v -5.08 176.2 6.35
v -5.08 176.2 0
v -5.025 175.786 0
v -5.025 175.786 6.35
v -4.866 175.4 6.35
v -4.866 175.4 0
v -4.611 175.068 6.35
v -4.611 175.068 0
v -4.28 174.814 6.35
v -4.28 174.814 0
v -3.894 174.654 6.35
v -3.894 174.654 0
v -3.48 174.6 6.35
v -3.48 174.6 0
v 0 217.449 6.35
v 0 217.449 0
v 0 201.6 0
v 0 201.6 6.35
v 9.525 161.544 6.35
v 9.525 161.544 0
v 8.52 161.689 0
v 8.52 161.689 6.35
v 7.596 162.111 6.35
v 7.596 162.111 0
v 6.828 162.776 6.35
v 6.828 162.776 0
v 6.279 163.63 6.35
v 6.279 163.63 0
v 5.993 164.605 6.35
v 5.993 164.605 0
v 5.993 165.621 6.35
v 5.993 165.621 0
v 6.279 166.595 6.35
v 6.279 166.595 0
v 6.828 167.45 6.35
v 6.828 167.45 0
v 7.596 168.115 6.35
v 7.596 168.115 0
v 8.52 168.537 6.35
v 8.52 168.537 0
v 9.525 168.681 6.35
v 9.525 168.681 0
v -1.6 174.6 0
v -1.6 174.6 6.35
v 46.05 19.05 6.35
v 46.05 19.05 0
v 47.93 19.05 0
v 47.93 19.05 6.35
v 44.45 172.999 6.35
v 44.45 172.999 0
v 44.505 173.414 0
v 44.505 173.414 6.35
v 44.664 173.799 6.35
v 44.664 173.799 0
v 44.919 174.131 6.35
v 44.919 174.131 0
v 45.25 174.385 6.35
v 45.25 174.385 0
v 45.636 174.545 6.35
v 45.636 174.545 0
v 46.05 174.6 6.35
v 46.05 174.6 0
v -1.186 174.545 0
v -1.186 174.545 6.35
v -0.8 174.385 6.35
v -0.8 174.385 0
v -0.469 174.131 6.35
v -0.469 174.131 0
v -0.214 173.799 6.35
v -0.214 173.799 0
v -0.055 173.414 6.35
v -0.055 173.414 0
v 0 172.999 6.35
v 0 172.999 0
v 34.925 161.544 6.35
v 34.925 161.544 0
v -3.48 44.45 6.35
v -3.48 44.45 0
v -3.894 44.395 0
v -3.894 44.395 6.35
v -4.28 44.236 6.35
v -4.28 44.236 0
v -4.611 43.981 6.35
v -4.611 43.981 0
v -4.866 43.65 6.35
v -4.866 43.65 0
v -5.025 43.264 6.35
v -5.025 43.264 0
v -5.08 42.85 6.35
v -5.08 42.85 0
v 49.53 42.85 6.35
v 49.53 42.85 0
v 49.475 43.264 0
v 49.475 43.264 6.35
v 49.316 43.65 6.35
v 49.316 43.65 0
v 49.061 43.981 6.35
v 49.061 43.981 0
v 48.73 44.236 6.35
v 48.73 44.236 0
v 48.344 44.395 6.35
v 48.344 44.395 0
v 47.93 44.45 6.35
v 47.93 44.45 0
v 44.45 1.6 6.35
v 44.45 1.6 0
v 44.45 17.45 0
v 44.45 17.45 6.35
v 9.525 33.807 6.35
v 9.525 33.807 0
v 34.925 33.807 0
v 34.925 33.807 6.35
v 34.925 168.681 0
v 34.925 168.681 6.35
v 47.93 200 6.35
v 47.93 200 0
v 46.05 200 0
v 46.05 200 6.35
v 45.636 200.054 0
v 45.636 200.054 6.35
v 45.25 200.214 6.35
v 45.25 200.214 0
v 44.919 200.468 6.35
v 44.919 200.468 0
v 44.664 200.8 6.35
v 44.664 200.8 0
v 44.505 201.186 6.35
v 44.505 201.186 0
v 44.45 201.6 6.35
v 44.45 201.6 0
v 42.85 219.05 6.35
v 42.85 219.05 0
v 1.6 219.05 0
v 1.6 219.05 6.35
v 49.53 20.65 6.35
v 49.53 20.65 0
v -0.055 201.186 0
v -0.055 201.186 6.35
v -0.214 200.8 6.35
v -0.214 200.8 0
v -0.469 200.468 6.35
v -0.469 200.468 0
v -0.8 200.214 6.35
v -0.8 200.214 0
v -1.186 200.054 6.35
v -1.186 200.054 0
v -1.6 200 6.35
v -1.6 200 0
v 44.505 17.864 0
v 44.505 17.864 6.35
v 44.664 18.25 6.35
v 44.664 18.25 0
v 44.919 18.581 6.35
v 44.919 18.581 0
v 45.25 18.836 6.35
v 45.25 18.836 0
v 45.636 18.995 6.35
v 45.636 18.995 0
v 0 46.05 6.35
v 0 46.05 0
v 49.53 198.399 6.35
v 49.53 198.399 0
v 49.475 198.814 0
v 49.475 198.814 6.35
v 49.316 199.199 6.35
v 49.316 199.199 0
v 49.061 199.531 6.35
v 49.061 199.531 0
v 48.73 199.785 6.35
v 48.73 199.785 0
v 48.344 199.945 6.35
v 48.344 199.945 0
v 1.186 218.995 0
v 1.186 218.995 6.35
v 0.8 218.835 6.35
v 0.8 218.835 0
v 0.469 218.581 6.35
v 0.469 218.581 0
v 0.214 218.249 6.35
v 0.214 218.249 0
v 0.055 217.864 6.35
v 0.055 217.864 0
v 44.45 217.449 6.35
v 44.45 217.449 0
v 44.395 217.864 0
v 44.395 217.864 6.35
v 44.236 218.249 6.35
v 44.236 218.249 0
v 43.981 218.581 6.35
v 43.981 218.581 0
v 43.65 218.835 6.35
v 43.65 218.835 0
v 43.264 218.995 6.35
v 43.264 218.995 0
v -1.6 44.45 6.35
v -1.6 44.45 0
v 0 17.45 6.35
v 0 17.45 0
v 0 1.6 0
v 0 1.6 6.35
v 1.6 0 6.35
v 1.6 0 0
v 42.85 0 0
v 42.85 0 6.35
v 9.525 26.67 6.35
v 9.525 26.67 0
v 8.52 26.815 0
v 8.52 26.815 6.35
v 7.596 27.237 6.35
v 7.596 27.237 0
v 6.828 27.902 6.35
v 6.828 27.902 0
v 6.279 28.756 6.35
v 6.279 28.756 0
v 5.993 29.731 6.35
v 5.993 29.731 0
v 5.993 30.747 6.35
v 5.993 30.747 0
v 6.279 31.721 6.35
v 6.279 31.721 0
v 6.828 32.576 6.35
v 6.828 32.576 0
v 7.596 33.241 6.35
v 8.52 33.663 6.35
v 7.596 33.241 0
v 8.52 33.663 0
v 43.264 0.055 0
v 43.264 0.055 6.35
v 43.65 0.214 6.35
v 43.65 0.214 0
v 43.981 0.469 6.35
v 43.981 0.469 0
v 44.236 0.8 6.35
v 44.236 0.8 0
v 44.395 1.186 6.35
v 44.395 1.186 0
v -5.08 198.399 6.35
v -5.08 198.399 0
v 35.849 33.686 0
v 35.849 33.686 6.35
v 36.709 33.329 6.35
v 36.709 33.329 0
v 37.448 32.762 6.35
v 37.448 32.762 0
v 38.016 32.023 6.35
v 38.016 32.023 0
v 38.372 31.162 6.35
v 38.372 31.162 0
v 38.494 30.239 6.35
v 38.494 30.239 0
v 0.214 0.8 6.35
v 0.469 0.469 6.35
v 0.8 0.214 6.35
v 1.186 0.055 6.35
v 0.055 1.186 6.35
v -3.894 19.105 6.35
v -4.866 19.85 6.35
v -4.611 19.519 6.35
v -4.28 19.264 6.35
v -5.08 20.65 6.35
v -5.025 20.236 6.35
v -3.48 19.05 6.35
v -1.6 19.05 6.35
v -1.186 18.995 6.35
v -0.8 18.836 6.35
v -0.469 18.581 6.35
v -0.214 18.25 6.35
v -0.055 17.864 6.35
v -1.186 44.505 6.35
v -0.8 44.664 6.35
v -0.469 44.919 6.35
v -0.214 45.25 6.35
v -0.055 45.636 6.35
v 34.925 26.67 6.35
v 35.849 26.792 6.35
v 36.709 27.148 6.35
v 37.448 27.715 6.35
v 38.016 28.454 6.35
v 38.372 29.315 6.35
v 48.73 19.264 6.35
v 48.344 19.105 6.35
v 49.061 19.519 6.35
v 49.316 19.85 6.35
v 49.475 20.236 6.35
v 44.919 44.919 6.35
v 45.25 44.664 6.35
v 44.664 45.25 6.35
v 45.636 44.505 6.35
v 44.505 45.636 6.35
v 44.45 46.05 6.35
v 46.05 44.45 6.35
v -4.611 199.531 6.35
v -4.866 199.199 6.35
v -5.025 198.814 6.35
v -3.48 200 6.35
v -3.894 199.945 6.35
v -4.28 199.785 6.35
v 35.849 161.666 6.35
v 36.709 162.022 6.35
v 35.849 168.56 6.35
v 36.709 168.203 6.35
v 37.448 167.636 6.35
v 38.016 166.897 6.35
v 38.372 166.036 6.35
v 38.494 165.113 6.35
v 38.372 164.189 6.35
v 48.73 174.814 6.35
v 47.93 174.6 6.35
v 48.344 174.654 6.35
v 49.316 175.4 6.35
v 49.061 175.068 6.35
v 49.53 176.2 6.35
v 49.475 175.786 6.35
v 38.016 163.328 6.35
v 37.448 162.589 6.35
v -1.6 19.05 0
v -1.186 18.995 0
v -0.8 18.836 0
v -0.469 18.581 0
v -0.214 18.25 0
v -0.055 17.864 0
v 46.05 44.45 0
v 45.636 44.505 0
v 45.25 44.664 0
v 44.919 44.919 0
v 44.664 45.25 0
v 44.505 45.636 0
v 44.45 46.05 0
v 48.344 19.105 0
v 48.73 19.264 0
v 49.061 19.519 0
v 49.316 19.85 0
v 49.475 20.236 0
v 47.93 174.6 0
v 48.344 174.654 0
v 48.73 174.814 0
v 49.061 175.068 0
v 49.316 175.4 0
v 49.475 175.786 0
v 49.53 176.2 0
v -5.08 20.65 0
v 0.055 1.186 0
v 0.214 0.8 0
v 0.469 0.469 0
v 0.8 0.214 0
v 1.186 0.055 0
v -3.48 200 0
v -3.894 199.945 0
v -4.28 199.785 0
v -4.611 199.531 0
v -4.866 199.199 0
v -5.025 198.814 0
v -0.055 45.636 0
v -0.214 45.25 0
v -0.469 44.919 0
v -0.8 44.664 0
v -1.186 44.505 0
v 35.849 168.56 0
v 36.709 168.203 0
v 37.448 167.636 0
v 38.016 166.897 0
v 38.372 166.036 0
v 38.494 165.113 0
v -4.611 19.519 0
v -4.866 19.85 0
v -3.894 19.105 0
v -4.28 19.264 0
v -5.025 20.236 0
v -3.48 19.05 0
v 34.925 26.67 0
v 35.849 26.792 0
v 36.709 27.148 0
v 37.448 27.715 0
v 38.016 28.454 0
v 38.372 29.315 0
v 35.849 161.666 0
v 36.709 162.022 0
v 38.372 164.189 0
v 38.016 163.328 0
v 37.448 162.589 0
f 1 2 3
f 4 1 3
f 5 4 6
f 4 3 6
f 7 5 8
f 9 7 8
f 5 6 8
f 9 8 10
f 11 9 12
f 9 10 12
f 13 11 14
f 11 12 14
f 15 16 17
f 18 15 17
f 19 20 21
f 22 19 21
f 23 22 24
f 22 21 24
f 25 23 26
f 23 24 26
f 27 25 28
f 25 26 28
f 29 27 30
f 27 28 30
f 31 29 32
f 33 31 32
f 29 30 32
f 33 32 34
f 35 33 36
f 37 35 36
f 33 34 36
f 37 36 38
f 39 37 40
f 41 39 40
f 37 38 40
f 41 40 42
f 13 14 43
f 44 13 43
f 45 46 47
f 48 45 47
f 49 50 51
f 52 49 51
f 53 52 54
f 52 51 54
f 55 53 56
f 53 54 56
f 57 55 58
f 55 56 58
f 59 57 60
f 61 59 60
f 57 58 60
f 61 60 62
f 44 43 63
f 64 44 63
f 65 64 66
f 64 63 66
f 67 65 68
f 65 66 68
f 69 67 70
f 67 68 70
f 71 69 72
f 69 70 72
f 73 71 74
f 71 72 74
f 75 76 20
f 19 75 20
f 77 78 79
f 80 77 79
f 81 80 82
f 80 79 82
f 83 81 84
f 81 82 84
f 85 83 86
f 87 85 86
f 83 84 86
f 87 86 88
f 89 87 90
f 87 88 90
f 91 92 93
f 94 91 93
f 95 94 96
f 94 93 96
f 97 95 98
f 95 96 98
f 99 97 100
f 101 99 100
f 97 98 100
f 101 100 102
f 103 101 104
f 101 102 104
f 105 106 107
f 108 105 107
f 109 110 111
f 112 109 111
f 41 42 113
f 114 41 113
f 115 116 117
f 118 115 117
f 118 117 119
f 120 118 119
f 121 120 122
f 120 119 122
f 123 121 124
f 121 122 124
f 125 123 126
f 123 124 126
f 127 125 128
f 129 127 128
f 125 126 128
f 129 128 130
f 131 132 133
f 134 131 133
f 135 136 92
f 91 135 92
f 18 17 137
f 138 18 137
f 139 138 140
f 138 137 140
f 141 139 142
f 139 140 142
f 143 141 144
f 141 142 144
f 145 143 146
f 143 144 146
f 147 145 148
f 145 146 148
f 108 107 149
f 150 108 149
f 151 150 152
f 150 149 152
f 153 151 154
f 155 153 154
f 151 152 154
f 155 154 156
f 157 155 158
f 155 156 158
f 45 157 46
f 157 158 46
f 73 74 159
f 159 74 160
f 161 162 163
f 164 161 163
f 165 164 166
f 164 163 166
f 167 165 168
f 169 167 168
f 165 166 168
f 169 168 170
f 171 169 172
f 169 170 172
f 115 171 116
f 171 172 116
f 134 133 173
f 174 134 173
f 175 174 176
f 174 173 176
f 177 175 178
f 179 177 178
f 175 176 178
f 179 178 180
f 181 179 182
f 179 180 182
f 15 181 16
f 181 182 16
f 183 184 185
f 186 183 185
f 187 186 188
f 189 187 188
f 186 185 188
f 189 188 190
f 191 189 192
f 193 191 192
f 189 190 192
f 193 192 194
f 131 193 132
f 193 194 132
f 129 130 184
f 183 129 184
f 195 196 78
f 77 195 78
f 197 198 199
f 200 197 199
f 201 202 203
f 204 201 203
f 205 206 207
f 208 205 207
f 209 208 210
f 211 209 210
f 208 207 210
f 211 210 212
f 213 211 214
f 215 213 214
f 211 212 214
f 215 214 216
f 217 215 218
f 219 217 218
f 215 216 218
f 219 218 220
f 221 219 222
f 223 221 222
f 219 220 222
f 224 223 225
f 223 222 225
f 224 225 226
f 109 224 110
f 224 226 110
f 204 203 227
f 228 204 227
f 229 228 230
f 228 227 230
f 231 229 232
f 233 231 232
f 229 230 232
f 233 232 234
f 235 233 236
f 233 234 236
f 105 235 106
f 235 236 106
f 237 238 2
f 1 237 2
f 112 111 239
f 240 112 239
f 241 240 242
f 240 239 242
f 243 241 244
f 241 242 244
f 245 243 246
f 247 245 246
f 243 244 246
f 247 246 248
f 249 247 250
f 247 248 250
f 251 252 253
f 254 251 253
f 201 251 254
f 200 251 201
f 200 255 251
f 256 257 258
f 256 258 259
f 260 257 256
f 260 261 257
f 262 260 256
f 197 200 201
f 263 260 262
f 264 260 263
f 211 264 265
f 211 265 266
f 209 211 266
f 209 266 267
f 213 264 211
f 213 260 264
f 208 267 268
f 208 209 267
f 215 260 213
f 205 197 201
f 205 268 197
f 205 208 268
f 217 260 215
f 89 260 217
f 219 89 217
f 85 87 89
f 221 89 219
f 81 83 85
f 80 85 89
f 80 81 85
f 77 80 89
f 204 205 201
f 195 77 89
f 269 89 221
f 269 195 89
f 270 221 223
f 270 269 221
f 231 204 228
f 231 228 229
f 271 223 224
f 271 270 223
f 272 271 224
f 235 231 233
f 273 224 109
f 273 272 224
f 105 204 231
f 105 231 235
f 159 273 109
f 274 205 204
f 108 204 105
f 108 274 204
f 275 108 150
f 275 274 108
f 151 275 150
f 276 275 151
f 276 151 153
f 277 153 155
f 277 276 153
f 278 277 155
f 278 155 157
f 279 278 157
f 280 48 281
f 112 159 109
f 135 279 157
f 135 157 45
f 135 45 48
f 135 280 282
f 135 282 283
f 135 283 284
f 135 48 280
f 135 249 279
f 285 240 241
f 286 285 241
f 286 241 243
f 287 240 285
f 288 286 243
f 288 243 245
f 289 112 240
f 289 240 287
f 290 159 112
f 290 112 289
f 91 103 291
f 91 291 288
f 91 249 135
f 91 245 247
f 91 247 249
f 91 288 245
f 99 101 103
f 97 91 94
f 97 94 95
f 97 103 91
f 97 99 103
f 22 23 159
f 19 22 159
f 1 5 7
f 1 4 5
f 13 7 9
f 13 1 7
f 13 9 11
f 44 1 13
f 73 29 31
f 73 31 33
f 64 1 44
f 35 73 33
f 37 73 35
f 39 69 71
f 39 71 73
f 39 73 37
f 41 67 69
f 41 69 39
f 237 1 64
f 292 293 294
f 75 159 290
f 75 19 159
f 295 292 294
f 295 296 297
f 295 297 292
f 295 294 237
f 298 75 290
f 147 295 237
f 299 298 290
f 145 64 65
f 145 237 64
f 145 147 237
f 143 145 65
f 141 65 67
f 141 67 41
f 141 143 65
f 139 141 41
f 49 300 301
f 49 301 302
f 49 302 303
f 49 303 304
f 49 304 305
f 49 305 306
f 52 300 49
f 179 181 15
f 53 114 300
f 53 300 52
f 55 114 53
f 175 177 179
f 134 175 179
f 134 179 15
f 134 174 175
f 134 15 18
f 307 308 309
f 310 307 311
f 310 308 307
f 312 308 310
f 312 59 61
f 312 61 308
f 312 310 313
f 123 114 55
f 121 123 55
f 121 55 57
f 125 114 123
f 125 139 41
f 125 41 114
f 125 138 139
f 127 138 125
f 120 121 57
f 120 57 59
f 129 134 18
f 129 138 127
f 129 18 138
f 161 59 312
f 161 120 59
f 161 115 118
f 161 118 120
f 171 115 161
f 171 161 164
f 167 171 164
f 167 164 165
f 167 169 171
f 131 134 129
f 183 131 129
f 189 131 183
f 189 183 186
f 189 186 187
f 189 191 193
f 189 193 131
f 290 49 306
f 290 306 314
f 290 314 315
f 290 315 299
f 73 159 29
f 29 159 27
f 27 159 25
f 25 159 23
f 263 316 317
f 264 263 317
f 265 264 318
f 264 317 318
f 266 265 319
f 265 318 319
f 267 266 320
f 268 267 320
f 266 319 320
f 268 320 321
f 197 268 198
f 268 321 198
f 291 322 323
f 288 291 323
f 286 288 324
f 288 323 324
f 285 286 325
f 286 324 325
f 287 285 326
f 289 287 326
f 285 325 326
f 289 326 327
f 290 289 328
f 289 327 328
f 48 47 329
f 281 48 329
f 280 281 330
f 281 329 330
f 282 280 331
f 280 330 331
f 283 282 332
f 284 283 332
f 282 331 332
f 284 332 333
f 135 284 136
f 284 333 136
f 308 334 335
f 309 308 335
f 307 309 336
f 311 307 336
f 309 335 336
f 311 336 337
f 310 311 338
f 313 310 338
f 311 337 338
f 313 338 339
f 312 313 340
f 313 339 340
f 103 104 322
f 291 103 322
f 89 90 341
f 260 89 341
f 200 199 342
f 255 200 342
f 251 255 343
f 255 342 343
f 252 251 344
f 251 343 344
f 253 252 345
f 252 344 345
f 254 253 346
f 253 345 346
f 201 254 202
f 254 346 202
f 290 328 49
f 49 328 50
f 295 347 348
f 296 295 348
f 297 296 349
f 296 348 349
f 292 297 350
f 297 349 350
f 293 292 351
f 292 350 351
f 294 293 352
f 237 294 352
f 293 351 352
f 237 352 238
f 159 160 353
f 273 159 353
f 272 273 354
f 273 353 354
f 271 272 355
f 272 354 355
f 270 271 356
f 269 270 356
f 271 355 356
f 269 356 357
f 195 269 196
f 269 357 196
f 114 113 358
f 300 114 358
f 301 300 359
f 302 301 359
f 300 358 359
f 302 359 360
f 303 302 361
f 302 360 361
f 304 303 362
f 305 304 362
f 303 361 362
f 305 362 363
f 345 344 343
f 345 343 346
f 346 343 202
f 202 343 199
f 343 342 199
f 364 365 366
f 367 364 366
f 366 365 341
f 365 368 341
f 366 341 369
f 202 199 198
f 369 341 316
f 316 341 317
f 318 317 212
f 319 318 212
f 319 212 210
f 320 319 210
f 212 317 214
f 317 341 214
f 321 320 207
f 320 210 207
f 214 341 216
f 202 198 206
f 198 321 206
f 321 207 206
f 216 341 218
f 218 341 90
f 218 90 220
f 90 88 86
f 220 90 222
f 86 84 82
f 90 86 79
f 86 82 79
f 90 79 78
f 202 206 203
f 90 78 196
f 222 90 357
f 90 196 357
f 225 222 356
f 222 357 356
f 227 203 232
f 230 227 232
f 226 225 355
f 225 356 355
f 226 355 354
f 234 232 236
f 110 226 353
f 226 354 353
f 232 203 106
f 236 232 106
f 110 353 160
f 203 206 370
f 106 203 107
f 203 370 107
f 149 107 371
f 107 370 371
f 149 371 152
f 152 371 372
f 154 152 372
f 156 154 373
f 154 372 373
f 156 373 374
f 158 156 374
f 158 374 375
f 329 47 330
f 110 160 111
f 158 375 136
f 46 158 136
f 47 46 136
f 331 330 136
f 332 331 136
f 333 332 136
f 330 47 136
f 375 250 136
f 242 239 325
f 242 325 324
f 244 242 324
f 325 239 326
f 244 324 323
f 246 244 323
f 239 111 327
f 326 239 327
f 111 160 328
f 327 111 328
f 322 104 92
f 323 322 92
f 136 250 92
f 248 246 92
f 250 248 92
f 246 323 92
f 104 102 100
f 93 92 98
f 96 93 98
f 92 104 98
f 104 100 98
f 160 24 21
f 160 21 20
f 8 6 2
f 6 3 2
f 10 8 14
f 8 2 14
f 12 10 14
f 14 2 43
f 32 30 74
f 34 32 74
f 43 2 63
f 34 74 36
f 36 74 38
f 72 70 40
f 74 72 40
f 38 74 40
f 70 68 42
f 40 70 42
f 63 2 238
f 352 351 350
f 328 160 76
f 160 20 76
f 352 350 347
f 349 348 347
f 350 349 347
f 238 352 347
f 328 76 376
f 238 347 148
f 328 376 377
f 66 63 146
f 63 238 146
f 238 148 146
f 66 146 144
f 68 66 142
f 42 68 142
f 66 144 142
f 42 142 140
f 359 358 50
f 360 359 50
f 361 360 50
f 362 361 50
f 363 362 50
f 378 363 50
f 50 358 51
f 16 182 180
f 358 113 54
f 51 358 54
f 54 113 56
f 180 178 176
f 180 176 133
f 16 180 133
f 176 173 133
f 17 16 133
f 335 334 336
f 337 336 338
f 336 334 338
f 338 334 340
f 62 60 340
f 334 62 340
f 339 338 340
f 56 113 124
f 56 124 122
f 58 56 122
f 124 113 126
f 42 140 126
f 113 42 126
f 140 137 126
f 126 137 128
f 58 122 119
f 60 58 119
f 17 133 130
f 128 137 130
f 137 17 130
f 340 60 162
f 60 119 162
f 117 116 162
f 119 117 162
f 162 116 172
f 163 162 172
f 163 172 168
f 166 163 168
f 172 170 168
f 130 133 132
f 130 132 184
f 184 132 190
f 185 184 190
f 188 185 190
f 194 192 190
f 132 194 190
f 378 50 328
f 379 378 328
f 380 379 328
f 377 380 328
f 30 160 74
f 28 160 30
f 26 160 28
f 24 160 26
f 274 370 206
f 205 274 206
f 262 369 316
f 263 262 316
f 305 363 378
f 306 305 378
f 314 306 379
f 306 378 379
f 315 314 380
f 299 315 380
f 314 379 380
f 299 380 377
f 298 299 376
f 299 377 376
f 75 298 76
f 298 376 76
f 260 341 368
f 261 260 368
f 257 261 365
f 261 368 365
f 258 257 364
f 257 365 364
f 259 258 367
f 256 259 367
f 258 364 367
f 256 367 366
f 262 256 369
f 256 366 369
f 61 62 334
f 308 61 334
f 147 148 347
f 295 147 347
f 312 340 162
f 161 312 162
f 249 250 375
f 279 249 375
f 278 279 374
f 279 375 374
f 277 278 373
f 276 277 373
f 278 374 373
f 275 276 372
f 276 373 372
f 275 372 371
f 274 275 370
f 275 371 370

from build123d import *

# Parameters (mm, degrees)
F1_DEPTH = 6.35


with BuildPart() as f1:
    # F0 (on Top) → F1 (new body)
    with BuildSketch(Plane.XY):
        with BuildLine():
            ThreePointArc((0, 1.6002), (0.468688, 0.468688), (1.6002, 0))
            Line((1.6002, 0), (42.8498, 0))
            ThreePointArc((42.8498, 0), (43.981312, 0.468688), (44.45, 1.6002))
            Line((44.45, 1.6002), (44.45, 17.4498))
            ThreePointArc((44.45, 17.4498), (44.918688, 18.581312), (46.0502, 19.05))
            Line((46.0502, 19.05), (47.9298, 19.05))
            ThreePointArc((47.9298, 19.05), (49.061312, 19.518688), (49.53, 20.6502))
            Line((49.53, 20.6502), (49.53, 42.8498))
            ThreePointArc((49.53, 42.8498), (49.061312, 43.981312), (47.9298, 44.45))
            Line((47.9298, 44.45), (46.0502, 44.45))
            ThreePointArc((46.0502, 44.45), (44.918688, 44.918688), (44.45, 46.0502))
            Line((44.45, 46.0502), (44.45, 172.9994))
            ThreePointArc((44.45, 172.9994), (44.918688, 174.130912), (46.0502, 174.5996))
            Line((46.0502, 174.5996), (47.9298, 174.5996))
            ThreePointArc((47.9298, 174.5996), (49.061312, 175.068288), (49.53, 176.1998))
            Line((49.53, 176.1998), (49.53, 198.3994))
            ThreePointArc((49.53, 198.3994), (49.061312, 199.530912), (47.9298, 199.9996))
            Line((47.9298, 199.9996), (46.0502, 199.9996))
            ThreePointArc((46.0502, 199.9996), (44.918688, 200.468288), (44.45, 201.5998))
            Line((44.45, 201.5998), (44.45, 217.4494))
            ThreePointArc((44.45, 217.4494), (43.981312, 218.580912), (42.8498, 219.0496))
            Line((42.8498, 219.0496), (1.6002, 219.0496))
            ThreePointArc((1.6002, 219.0496), (0.468688, 218.580912), (0, 217.4494))
            Line((0, 217.4494), (0, 201.5998))
            ThreePointArc((0, 201.5998), (-0.468688, 200.468288), (-1.6002, 199.9996))
            Line((-1.6002, 199.9996), (-3.4798, 199.9996))
            ThreePointArc((-3.4798, 199.9996), (-4.611312, 199.530912), (-5.08, 198.3994))
            Line((-5.08, 198.3994), (-5.08, 176.1998))
            ThreePointArc((-5.08, 176.1998), (-4.611312, 175.068288), (-3.4798, 174.5996))
            Line((-3.4798, 174.5996), (-1.6002, 174.5996))
            ThreePointArc((-1.6002, 174.5996), (-0.468688, 174.130912), (0, 172.9994))
            Line((0, 172.9994), (0, 46.0502))
            ThreePointArc((0, 46.0502), (-0.468688, 44.918688), (-1.6002, 44.45))
            Line((-1.6002, 44.45), (-3.4798, 44.45))
            ThreePointArc((-3.4798, 44.45), (-4.611312, 43.981312), (-5.08, 42.8498))
            Line((-5.08, 42.8498), (-5.08, 20.6502))
            ThreePointArc((-5.08, 20.6502), (-4.611312, 19.518688), (-3.4798, 19.05))
            Line((-3.4798, 19.05), (-1.6002, 19.05))
            ThreePointArc((-1.6002, 19.05), (-0.468688, 18.581312), (0, 17.4498))
            Line((0, 17.4498), (0, 1.6002))
        make_face()
        with BuildLine():
            ThreePointArc((9.525, 26.67), (5.9563, 30.2387), (9.525, 33.8074))
            Line((9.525, 33.8074), (34.925, 33.8074))
            ThreePointArc((34.925, 33.8074), (37.448452, 32.762152), (38.4937, 30.2387))
            ThreePointArc((38.4937, 30.2387), (37.448452, 27.715248), (34.925, 26.67))
            Line((34.925, 26.67), (9.525, 26.67))
        make_face(mode=Mode.SUBTRACT)
        with BuildLine():
            ThreePointArc((9.525, 161.544), (5.9563, 165.1127), (9.525, 168.6814))
            Line((9.525, 168.6814), (34.925, 168.6814))
            ThreePointArc((34.925, 168.6814), (37.448452, 167.636152), (38.4937, 165.1127))
            ThreePointArc((38.4937, 165.1127), (37.448452, 162.589248), (34.925, 161.544))
            Line((34.925, 161.544), (9.525, 161.544))
        make_face(mode=Mode.SUBTRACT)
    extrude(amount=F1_DEPTH)


solid = f1.part
